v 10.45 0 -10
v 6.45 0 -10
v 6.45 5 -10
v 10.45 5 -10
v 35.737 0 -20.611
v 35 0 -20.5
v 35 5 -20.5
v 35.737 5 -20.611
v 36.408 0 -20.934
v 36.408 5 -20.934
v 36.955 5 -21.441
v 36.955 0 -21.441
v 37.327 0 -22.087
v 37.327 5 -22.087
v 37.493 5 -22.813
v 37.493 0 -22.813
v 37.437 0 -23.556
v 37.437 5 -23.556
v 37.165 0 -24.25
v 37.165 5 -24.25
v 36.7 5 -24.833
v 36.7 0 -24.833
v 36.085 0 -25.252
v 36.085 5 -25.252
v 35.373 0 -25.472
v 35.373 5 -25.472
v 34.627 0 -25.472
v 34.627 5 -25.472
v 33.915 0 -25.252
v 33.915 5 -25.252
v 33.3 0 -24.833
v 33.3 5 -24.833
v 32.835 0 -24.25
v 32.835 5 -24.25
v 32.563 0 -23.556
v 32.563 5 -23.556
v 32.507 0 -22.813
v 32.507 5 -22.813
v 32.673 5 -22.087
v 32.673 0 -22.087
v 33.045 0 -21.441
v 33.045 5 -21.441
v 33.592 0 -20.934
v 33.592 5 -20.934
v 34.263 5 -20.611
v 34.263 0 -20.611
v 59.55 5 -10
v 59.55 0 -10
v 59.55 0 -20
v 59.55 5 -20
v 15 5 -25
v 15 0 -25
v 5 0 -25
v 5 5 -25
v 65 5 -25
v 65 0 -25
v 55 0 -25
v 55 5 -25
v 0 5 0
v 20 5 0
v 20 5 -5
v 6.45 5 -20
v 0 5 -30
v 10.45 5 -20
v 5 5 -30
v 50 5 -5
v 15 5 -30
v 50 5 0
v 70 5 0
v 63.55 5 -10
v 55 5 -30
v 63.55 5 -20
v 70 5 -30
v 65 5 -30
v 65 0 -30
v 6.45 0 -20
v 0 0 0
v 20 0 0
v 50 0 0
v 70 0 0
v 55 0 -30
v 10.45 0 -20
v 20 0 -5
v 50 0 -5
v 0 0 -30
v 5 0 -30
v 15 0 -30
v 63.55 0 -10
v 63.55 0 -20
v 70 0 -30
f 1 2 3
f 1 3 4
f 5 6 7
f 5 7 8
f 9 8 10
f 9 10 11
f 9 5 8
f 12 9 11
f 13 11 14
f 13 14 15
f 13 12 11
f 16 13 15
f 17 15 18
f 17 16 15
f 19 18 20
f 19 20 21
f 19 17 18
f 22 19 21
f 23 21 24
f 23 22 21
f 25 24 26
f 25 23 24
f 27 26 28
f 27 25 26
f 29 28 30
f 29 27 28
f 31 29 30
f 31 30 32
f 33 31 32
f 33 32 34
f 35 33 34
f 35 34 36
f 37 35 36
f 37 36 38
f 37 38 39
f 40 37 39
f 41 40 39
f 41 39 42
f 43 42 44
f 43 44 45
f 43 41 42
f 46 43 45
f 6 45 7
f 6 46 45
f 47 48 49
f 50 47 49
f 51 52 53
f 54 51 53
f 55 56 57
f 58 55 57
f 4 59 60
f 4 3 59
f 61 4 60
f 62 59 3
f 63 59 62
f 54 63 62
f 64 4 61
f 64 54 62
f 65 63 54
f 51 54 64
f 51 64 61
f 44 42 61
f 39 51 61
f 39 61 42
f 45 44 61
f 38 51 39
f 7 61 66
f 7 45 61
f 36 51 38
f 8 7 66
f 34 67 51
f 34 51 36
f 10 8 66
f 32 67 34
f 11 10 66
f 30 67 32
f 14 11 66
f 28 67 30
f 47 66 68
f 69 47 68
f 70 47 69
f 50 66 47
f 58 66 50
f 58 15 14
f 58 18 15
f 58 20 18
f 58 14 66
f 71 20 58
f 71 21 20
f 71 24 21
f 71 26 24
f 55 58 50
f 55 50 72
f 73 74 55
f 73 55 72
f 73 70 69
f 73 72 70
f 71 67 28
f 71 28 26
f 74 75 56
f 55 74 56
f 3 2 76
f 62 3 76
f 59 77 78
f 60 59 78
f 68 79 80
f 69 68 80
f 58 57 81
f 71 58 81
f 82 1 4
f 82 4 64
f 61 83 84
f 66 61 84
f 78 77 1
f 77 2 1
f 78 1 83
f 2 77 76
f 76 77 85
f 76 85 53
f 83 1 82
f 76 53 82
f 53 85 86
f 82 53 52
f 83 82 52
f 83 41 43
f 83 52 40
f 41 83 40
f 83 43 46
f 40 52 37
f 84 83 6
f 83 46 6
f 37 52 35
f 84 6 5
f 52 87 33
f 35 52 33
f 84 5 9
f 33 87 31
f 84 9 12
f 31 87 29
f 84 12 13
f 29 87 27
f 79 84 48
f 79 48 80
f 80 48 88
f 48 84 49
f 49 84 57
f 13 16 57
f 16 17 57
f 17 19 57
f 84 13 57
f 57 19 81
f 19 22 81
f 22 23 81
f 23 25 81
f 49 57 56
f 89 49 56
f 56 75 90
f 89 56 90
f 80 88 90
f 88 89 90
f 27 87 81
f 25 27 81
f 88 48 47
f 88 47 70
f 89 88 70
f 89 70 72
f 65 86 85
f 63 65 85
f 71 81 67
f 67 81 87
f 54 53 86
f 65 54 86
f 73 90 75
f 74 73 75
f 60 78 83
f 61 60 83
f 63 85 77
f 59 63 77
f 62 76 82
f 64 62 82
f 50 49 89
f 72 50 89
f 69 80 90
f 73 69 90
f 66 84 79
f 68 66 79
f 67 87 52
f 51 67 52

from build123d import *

# Parameters (mm, degrees)
SKETCH_1_R      = 2.5
SKETCH_1_W      = 4
SKETCH_1_H      = 10
EXTRUDE_1_DEPTH = 5


with BuildPart() as part:
    # 草图1 → 凸台-拉伸1 (new body)
    with BuildSketch(Plane(origin=(0, 0, 0), x_dir=(1, 0, 0), z_dir=(0, 1, 0))):
        Polygon((0, 0), (20, 0), (20, 5), (50, 5), (50, 0), (70, 0), (70, 30), (65, 30), (65, 25), (55, 25), (55, 30), (15, 30), (15, 25), (5, 25), (5, 30), (0, 30), align=None)
        with Locations(Location((35, 23, 0), (0, 0, 270))):
            Circle(SKETCH_1_R, mode=Mode.SUBTRACT)
        with Locations((61.55, 15)):
            Rectangle(SKETCH_1_W, SKETCH_1_H, mode=Mode.SUBTRACT)
        with Locations((8.45, 15)):
            Rectangle(SKETCH_1_W, SKETCH_1_H, mode=Mode.SUBTRACT)
    extrude(amount=EXTRUDE_1_DEPTH)


solid = part.part
